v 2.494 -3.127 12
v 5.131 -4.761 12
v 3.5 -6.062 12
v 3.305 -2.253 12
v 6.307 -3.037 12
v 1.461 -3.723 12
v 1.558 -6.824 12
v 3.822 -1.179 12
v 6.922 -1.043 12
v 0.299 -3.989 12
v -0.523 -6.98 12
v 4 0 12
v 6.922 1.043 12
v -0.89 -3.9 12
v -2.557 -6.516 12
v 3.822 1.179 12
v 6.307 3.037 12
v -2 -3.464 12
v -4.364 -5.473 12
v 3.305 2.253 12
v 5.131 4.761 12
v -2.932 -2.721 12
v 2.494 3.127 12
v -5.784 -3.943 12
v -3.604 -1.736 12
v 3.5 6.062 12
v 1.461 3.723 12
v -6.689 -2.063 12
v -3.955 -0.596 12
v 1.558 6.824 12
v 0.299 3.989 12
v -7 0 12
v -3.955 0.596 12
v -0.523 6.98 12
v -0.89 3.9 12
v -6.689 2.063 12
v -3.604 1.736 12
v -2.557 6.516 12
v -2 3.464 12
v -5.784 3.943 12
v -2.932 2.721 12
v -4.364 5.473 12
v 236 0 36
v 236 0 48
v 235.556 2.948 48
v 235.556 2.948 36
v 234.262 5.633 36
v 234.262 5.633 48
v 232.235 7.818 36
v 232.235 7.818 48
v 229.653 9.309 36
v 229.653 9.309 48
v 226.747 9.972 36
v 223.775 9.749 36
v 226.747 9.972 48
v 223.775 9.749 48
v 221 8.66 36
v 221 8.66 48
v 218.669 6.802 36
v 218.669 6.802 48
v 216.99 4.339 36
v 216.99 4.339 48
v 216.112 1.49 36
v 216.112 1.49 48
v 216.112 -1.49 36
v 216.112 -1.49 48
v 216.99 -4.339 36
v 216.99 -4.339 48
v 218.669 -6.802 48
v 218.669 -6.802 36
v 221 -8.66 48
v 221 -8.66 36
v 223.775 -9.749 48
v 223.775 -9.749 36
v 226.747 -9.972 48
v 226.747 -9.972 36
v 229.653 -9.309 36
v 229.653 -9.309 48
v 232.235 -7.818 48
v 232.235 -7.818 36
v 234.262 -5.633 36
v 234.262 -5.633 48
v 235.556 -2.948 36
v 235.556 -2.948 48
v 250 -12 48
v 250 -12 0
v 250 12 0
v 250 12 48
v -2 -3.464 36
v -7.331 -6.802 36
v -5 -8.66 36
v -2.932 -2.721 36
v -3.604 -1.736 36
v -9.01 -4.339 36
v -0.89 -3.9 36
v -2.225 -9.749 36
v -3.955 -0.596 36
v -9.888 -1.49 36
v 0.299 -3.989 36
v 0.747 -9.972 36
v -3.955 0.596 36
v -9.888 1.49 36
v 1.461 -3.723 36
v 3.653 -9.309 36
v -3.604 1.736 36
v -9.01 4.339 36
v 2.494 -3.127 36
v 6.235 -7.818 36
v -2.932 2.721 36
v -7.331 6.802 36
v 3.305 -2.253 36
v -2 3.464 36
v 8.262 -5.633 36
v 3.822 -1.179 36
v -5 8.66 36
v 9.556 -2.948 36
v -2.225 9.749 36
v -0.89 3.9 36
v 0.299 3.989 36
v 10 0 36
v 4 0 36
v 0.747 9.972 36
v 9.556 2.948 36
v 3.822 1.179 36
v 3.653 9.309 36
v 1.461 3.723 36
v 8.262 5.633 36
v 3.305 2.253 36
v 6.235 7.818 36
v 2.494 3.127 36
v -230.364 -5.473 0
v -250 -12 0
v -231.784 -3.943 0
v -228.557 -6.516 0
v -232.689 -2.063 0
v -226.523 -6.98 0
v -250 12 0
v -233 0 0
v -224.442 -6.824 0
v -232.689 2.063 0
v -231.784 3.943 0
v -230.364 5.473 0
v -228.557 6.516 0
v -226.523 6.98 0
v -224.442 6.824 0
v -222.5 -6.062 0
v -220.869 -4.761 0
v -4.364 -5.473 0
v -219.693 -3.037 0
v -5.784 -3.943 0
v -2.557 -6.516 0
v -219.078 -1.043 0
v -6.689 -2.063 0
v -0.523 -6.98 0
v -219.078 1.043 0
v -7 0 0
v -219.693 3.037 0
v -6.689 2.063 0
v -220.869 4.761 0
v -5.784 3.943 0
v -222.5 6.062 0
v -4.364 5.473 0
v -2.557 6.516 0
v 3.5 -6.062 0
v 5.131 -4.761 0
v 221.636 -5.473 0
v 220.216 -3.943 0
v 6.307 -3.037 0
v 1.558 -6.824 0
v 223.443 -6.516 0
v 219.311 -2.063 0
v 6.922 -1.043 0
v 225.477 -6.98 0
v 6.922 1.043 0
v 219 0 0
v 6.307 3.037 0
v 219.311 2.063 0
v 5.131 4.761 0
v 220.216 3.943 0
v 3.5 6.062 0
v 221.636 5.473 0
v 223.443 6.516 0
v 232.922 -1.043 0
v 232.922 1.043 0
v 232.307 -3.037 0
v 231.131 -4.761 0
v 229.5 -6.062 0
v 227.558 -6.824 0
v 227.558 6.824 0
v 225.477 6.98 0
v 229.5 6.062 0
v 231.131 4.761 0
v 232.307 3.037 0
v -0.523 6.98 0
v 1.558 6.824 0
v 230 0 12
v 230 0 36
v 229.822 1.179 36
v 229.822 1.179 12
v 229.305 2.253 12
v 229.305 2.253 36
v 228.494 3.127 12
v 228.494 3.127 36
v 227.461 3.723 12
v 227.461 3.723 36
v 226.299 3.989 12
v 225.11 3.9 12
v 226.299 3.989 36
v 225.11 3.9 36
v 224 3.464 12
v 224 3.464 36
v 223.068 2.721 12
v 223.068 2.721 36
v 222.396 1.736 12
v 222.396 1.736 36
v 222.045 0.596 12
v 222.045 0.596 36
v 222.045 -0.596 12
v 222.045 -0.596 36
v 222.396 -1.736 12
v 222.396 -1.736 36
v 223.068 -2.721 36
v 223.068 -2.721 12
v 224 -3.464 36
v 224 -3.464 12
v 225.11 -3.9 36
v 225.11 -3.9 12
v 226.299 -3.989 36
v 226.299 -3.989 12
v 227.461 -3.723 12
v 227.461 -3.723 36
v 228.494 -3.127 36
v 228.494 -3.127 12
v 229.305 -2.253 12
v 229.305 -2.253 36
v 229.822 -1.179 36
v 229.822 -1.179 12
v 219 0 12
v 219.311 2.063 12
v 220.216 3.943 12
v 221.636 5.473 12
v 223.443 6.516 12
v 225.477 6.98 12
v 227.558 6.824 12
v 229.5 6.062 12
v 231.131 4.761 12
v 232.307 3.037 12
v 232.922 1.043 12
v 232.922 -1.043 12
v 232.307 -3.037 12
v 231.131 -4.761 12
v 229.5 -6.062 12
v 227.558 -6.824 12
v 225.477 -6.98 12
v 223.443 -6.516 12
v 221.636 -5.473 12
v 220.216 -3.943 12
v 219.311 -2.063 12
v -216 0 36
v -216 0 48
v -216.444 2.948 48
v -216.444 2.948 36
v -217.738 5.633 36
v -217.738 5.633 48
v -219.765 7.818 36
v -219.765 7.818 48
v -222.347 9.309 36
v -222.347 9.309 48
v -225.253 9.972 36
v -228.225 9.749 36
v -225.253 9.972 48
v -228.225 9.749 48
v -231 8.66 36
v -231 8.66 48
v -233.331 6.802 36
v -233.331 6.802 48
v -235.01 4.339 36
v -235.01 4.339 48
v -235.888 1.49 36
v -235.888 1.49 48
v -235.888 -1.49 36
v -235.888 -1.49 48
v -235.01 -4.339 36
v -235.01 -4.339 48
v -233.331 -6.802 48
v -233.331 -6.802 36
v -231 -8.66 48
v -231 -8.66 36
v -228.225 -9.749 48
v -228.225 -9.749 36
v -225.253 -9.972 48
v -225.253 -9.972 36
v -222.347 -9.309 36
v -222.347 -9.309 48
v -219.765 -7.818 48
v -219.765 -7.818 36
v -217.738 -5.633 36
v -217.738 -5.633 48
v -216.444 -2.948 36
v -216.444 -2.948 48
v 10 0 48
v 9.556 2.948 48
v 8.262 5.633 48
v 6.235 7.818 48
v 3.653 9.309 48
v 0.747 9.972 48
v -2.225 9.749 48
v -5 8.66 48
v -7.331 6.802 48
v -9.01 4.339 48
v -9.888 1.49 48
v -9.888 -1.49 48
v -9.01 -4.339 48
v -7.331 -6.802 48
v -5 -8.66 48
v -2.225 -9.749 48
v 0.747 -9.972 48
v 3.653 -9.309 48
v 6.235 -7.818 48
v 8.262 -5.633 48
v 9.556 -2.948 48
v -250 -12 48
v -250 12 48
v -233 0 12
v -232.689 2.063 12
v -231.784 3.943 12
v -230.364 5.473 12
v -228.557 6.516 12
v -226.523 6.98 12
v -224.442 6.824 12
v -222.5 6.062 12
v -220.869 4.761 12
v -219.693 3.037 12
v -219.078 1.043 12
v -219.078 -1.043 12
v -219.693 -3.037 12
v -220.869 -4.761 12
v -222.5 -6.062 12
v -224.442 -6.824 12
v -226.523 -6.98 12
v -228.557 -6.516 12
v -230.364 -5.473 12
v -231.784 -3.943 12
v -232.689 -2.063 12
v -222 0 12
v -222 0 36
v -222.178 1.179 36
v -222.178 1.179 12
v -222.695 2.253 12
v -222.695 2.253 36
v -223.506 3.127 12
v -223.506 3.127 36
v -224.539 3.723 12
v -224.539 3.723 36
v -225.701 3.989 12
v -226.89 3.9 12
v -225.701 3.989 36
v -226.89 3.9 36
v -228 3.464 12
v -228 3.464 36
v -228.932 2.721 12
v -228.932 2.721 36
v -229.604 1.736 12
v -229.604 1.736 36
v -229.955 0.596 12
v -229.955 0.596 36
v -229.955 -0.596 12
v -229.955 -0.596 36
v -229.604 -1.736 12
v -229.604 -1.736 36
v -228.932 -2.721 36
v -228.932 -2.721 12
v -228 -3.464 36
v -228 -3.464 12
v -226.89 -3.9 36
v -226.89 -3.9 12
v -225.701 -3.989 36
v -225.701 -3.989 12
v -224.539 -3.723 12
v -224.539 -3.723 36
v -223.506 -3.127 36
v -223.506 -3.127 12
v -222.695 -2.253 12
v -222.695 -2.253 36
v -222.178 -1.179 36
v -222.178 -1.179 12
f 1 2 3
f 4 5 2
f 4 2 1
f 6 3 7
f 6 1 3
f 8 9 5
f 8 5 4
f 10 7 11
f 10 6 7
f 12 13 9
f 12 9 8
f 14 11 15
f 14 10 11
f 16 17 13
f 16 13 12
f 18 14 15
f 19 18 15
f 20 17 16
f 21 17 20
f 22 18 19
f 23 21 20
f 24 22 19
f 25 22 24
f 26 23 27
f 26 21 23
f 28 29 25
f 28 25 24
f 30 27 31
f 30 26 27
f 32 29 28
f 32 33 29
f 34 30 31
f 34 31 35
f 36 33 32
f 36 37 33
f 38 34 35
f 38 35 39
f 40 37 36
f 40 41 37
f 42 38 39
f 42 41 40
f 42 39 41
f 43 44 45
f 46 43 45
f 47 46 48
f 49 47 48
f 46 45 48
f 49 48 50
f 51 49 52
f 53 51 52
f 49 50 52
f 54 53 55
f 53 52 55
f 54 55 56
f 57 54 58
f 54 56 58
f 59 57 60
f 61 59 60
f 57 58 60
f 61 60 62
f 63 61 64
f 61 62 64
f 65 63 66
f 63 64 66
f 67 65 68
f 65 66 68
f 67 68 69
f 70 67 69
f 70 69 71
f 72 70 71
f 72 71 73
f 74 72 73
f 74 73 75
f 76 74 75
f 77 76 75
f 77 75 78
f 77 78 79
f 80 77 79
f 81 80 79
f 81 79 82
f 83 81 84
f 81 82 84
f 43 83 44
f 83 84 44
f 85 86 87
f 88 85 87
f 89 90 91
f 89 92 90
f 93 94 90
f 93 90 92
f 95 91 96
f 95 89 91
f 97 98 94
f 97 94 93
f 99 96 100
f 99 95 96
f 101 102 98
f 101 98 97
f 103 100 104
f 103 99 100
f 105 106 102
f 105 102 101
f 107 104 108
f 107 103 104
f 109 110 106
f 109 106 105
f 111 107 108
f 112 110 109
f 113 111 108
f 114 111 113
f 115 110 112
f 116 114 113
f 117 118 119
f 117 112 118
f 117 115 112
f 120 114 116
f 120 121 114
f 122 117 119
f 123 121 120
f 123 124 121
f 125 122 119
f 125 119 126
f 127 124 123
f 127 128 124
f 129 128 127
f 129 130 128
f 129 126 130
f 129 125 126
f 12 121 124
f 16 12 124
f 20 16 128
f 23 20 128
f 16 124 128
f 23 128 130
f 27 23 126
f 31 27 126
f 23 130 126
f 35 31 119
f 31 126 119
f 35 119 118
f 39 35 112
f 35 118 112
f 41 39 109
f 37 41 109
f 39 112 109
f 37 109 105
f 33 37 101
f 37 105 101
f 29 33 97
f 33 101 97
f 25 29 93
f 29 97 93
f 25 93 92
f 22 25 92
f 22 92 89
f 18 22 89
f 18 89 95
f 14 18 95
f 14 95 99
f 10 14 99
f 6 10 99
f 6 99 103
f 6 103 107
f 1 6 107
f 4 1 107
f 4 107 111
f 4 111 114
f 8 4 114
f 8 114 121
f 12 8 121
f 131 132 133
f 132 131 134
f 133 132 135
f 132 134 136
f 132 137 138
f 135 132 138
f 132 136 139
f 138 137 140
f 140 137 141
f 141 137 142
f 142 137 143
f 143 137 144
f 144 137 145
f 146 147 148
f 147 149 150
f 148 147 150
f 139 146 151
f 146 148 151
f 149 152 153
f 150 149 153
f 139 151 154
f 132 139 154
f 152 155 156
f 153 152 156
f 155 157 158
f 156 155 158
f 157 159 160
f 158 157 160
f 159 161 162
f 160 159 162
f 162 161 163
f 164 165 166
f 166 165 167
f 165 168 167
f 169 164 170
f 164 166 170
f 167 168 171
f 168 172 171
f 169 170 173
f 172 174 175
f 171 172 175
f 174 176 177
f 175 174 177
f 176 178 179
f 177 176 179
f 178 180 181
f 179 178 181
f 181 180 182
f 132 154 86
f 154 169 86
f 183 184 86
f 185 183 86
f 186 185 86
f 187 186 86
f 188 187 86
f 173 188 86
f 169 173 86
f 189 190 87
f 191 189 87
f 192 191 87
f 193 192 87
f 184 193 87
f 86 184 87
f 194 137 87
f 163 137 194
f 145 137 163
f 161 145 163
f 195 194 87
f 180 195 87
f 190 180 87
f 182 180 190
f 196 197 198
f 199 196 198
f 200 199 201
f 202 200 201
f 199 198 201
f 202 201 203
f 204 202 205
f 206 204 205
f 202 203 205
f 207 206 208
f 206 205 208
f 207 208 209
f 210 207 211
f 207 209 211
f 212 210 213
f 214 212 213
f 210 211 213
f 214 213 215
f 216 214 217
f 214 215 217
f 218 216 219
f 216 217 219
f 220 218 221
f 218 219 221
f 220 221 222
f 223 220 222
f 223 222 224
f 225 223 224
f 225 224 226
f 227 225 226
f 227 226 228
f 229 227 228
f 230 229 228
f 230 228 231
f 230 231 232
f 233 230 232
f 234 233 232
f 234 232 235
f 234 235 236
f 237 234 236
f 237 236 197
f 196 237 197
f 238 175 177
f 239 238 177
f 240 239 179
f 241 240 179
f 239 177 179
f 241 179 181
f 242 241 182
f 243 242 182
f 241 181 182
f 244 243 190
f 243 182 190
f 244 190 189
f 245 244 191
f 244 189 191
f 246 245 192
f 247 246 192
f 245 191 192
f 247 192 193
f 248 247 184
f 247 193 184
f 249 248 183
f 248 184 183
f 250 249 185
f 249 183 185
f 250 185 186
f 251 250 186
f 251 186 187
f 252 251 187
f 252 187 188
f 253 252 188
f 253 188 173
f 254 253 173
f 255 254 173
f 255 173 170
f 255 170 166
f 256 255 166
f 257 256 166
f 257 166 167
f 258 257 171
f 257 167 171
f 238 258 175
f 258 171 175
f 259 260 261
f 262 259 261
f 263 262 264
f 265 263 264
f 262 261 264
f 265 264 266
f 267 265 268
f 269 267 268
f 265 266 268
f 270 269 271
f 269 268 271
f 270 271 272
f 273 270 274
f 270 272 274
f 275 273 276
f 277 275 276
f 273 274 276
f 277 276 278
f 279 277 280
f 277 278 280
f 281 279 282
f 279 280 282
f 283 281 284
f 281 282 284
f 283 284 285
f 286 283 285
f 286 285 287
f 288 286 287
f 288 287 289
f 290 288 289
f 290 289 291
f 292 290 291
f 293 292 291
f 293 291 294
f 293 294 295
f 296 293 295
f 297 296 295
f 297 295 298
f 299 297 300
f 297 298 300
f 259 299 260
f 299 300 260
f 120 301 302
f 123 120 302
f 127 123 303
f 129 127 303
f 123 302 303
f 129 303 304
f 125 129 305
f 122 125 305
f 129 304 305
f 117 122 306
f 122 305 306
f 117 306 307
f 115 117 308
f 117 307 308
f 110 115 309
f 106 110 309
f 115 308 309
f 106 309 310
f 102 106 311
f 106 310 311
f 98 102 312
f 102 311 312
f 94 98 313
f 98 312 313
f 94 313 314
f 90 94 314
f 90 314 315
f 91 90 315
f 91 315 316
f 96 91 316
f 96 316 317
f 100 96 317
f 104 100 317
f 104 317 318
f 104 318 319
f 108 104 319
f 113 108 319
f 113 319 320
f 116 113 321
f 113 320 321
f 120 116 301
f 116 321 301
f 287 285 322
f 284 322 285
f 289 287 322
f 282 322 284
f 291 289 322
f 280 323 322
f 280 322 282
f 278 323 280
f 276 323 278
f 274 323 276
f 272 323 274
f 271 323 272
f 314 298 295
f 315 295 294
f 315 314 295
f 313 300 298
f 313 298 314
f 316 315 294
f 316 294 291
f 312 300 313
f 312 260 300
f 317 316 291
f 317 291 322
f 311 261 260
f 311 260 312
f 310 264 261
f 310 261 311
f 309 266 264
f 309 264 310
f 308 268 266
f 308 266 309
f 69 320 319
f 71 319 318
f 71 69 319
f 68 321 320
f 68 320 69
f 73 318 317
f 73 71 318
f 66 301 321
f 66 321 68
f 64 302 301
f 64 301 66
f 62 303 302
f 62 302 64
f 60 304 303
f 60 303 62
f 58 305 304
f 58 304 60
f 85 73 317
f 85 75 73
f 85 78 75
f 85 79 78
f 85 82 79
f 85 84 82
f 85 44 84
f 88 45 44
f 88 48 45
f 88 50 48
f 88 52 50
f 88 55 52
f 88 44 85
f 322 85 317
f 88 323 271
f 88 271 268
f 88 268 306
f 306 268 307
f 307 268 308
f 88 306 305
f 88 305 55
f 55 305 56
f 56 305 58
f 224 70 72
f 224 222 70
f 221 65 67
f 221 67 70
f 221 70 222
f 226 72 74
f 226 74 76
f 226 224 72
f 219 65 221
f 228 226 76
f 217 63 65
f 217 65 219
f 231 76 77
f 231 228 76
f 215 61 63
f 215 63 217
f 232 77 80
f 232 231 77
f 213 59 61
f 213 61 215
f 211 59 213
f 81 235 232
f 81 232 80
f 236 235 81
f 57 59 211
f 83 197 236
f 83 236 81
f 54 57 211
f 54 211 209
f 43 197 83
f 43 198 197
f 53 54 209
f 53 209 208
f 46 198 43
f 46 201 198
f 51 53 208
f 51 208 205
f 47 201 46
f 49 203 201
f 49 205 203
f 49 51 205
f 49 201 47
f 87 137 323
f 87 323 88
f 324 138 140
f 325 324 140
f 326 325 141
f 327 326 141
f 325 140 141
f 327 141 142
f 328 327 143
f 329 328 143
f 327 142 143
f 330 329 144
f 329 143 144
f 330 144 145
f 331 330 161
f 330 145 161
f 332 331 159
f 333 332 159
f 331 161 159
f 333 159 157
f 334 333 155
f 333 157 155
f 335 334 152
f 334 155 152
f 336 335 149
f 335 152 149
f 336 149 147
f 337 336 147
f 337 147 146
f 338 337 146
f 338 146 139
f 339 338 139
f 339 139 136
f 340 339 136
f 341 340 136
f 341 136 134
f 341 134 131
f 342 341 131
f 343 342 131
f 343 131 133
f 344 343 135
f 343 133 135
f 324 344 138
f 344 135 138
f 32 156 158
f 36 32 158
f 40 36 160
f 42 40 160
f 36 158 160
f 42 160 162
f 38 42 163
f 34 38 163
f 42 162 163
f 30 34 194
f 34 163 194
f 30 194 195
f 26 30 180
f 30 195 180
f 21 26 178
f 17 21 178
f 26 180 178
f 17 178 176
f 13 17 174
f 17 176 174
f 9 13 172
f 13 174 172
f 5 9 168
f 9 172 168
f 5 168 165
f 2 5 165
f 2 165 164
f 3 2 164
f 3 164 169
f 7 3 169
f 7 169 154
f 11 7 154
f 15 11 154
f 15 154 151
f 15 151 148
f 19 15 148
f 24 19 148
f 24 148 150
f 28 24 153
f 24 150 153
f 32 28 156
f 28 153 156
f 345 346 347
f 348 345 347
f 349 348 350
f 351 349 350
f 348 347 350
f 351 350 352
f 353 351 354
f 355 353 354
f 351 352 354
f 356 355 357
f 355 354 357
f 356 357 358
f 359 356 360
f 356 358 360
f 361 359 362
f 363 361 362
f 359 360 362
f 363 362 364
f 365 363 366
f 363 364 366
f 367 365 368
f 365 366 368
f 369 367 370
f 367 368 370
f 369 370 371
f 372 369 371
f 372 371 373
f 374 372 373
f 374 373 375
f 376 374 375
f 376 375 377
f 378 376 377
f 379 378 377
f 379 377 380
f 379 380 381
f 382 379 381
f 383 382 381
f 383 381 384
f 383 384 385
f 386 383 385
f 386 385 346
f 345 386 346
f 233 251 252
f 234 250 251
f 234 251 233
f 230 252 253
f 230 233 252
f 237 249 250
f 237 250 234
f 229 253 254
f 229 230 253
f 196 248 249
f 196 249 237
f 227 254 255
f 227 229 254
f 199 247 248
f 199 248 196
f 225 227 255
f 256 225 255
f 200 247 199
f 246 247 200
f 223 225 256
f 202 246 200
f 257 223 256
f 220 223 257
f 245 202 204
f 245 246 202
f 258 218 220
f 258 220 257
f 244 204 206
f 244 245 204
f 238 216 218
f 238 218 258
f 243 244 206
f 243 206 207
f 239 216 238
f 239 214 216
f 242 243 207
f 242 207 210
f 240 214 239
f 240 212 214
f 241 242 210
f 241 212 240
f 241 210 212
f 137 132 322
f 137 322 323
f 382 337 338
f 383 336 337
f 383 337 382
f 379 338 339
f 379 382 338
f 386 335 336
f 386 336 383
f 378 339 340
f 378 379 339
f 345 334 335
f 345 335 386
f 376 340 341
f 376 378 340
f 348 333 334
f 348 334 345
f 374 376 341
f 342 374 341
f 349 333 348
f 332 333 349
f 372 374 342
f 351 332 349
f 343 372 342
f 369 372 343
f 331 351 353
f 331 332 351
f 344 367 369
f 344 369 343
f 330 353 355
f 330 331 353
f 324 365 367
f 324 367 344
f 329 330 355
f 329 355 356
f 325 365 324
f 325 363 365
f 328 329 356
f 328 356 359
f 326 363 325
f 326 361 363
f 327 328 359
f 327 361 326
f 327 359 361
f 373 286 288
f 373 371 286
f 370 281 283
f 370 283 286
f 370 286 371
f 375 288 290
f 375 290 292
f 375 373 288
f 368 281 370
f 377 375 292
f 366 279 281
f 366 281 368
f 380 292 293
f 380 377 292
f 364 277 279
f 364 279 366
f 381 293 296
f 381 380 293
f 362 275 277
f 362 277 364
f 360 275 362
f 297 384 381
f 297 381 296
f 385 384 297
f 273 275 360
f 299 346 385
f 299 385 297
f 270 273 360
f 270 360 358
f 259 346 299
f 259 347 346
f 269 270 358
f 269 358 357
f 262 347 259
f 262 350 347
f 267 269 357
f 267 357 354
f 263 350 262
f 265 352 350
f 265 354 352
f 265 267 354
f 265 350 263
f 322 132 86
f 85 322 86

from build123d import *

# Parameters (mm, degrees)
ESQUISSE1_W             = 500
ESQUISSE1_H             = 24
BOSS_EXTRU_1_DEPTH      = 48
ESQUISSE2_R             = 4
ENL_V_MAT_EXTRU_1_DEPTH = 255.848974885
ESQUISSE3_R             = 10
ENL_V_MAT_EXTRU_2_DEPTH = 12
ESQUISSE4_R             = 7
ENL_V_MAT_EXTRU_3_DEPTH = 12


with BuildPart() as part:
    # Esquisse1 → Boss.-Extru.1 (new body)
    with BuildSketch(Plane.XY):
        Rectangle(ESQUISSE1_W, ESQUISSE1_H)
    extrude(amount=BOSS_EXTRU_1_DEPTH)

    # Esquisse2 → Enlèv. mat.-Extru.1 (cut, through all)
    with BuildSketch(Plane.XY.offset(48)):
        with Locations((-226, 0)):
            Circle(ESQUISSE2_R)
        Circle(ESQUISSE2_R)
        with Locations((226, 0)):
            Circle(ESQUISSE2_R)
    extrude(amount=-ENL_V_MAT_EXTRU_1_DEPTH, mode=Mode.SUBTRACT)

    # Esquisse3 → Enlèv. mat.-Extru.2 (cut)
    with BuildSketch(Plane.XY.offset(48)):
        with Locations((-226, 0)):
            Circle(ESQUISSE3_R)
        Circle(ESQUISSE3_R)
        with Locations((226, 0)):
            Circle(ESQUISSE3_R)
    extrude(amount=-ENL_V_MAT_EXTRU_2_DEPTH, mode=Mode.SUBTRACT)

    # Esquisse4 → Enlèv. mat.-Extru.3 (cut)
    with BuildSketch(Plane(origin=(0, 0, 0), x_dir=(-1, 0, 0), z_dir=(0, 0, -1))):
        with Locations((-226, 0)):
            Circle(ESQUISSE4_R)
        Circle(ESQUISSE4_R)
        with Locations((226, 0)):
            Circle(ESQUISSE4_R)
    extrude(amount=-ENL_V_MAT_EXTRU_3_DEPTH, mode=Mode.SUBTRACT)


solid = part.part
